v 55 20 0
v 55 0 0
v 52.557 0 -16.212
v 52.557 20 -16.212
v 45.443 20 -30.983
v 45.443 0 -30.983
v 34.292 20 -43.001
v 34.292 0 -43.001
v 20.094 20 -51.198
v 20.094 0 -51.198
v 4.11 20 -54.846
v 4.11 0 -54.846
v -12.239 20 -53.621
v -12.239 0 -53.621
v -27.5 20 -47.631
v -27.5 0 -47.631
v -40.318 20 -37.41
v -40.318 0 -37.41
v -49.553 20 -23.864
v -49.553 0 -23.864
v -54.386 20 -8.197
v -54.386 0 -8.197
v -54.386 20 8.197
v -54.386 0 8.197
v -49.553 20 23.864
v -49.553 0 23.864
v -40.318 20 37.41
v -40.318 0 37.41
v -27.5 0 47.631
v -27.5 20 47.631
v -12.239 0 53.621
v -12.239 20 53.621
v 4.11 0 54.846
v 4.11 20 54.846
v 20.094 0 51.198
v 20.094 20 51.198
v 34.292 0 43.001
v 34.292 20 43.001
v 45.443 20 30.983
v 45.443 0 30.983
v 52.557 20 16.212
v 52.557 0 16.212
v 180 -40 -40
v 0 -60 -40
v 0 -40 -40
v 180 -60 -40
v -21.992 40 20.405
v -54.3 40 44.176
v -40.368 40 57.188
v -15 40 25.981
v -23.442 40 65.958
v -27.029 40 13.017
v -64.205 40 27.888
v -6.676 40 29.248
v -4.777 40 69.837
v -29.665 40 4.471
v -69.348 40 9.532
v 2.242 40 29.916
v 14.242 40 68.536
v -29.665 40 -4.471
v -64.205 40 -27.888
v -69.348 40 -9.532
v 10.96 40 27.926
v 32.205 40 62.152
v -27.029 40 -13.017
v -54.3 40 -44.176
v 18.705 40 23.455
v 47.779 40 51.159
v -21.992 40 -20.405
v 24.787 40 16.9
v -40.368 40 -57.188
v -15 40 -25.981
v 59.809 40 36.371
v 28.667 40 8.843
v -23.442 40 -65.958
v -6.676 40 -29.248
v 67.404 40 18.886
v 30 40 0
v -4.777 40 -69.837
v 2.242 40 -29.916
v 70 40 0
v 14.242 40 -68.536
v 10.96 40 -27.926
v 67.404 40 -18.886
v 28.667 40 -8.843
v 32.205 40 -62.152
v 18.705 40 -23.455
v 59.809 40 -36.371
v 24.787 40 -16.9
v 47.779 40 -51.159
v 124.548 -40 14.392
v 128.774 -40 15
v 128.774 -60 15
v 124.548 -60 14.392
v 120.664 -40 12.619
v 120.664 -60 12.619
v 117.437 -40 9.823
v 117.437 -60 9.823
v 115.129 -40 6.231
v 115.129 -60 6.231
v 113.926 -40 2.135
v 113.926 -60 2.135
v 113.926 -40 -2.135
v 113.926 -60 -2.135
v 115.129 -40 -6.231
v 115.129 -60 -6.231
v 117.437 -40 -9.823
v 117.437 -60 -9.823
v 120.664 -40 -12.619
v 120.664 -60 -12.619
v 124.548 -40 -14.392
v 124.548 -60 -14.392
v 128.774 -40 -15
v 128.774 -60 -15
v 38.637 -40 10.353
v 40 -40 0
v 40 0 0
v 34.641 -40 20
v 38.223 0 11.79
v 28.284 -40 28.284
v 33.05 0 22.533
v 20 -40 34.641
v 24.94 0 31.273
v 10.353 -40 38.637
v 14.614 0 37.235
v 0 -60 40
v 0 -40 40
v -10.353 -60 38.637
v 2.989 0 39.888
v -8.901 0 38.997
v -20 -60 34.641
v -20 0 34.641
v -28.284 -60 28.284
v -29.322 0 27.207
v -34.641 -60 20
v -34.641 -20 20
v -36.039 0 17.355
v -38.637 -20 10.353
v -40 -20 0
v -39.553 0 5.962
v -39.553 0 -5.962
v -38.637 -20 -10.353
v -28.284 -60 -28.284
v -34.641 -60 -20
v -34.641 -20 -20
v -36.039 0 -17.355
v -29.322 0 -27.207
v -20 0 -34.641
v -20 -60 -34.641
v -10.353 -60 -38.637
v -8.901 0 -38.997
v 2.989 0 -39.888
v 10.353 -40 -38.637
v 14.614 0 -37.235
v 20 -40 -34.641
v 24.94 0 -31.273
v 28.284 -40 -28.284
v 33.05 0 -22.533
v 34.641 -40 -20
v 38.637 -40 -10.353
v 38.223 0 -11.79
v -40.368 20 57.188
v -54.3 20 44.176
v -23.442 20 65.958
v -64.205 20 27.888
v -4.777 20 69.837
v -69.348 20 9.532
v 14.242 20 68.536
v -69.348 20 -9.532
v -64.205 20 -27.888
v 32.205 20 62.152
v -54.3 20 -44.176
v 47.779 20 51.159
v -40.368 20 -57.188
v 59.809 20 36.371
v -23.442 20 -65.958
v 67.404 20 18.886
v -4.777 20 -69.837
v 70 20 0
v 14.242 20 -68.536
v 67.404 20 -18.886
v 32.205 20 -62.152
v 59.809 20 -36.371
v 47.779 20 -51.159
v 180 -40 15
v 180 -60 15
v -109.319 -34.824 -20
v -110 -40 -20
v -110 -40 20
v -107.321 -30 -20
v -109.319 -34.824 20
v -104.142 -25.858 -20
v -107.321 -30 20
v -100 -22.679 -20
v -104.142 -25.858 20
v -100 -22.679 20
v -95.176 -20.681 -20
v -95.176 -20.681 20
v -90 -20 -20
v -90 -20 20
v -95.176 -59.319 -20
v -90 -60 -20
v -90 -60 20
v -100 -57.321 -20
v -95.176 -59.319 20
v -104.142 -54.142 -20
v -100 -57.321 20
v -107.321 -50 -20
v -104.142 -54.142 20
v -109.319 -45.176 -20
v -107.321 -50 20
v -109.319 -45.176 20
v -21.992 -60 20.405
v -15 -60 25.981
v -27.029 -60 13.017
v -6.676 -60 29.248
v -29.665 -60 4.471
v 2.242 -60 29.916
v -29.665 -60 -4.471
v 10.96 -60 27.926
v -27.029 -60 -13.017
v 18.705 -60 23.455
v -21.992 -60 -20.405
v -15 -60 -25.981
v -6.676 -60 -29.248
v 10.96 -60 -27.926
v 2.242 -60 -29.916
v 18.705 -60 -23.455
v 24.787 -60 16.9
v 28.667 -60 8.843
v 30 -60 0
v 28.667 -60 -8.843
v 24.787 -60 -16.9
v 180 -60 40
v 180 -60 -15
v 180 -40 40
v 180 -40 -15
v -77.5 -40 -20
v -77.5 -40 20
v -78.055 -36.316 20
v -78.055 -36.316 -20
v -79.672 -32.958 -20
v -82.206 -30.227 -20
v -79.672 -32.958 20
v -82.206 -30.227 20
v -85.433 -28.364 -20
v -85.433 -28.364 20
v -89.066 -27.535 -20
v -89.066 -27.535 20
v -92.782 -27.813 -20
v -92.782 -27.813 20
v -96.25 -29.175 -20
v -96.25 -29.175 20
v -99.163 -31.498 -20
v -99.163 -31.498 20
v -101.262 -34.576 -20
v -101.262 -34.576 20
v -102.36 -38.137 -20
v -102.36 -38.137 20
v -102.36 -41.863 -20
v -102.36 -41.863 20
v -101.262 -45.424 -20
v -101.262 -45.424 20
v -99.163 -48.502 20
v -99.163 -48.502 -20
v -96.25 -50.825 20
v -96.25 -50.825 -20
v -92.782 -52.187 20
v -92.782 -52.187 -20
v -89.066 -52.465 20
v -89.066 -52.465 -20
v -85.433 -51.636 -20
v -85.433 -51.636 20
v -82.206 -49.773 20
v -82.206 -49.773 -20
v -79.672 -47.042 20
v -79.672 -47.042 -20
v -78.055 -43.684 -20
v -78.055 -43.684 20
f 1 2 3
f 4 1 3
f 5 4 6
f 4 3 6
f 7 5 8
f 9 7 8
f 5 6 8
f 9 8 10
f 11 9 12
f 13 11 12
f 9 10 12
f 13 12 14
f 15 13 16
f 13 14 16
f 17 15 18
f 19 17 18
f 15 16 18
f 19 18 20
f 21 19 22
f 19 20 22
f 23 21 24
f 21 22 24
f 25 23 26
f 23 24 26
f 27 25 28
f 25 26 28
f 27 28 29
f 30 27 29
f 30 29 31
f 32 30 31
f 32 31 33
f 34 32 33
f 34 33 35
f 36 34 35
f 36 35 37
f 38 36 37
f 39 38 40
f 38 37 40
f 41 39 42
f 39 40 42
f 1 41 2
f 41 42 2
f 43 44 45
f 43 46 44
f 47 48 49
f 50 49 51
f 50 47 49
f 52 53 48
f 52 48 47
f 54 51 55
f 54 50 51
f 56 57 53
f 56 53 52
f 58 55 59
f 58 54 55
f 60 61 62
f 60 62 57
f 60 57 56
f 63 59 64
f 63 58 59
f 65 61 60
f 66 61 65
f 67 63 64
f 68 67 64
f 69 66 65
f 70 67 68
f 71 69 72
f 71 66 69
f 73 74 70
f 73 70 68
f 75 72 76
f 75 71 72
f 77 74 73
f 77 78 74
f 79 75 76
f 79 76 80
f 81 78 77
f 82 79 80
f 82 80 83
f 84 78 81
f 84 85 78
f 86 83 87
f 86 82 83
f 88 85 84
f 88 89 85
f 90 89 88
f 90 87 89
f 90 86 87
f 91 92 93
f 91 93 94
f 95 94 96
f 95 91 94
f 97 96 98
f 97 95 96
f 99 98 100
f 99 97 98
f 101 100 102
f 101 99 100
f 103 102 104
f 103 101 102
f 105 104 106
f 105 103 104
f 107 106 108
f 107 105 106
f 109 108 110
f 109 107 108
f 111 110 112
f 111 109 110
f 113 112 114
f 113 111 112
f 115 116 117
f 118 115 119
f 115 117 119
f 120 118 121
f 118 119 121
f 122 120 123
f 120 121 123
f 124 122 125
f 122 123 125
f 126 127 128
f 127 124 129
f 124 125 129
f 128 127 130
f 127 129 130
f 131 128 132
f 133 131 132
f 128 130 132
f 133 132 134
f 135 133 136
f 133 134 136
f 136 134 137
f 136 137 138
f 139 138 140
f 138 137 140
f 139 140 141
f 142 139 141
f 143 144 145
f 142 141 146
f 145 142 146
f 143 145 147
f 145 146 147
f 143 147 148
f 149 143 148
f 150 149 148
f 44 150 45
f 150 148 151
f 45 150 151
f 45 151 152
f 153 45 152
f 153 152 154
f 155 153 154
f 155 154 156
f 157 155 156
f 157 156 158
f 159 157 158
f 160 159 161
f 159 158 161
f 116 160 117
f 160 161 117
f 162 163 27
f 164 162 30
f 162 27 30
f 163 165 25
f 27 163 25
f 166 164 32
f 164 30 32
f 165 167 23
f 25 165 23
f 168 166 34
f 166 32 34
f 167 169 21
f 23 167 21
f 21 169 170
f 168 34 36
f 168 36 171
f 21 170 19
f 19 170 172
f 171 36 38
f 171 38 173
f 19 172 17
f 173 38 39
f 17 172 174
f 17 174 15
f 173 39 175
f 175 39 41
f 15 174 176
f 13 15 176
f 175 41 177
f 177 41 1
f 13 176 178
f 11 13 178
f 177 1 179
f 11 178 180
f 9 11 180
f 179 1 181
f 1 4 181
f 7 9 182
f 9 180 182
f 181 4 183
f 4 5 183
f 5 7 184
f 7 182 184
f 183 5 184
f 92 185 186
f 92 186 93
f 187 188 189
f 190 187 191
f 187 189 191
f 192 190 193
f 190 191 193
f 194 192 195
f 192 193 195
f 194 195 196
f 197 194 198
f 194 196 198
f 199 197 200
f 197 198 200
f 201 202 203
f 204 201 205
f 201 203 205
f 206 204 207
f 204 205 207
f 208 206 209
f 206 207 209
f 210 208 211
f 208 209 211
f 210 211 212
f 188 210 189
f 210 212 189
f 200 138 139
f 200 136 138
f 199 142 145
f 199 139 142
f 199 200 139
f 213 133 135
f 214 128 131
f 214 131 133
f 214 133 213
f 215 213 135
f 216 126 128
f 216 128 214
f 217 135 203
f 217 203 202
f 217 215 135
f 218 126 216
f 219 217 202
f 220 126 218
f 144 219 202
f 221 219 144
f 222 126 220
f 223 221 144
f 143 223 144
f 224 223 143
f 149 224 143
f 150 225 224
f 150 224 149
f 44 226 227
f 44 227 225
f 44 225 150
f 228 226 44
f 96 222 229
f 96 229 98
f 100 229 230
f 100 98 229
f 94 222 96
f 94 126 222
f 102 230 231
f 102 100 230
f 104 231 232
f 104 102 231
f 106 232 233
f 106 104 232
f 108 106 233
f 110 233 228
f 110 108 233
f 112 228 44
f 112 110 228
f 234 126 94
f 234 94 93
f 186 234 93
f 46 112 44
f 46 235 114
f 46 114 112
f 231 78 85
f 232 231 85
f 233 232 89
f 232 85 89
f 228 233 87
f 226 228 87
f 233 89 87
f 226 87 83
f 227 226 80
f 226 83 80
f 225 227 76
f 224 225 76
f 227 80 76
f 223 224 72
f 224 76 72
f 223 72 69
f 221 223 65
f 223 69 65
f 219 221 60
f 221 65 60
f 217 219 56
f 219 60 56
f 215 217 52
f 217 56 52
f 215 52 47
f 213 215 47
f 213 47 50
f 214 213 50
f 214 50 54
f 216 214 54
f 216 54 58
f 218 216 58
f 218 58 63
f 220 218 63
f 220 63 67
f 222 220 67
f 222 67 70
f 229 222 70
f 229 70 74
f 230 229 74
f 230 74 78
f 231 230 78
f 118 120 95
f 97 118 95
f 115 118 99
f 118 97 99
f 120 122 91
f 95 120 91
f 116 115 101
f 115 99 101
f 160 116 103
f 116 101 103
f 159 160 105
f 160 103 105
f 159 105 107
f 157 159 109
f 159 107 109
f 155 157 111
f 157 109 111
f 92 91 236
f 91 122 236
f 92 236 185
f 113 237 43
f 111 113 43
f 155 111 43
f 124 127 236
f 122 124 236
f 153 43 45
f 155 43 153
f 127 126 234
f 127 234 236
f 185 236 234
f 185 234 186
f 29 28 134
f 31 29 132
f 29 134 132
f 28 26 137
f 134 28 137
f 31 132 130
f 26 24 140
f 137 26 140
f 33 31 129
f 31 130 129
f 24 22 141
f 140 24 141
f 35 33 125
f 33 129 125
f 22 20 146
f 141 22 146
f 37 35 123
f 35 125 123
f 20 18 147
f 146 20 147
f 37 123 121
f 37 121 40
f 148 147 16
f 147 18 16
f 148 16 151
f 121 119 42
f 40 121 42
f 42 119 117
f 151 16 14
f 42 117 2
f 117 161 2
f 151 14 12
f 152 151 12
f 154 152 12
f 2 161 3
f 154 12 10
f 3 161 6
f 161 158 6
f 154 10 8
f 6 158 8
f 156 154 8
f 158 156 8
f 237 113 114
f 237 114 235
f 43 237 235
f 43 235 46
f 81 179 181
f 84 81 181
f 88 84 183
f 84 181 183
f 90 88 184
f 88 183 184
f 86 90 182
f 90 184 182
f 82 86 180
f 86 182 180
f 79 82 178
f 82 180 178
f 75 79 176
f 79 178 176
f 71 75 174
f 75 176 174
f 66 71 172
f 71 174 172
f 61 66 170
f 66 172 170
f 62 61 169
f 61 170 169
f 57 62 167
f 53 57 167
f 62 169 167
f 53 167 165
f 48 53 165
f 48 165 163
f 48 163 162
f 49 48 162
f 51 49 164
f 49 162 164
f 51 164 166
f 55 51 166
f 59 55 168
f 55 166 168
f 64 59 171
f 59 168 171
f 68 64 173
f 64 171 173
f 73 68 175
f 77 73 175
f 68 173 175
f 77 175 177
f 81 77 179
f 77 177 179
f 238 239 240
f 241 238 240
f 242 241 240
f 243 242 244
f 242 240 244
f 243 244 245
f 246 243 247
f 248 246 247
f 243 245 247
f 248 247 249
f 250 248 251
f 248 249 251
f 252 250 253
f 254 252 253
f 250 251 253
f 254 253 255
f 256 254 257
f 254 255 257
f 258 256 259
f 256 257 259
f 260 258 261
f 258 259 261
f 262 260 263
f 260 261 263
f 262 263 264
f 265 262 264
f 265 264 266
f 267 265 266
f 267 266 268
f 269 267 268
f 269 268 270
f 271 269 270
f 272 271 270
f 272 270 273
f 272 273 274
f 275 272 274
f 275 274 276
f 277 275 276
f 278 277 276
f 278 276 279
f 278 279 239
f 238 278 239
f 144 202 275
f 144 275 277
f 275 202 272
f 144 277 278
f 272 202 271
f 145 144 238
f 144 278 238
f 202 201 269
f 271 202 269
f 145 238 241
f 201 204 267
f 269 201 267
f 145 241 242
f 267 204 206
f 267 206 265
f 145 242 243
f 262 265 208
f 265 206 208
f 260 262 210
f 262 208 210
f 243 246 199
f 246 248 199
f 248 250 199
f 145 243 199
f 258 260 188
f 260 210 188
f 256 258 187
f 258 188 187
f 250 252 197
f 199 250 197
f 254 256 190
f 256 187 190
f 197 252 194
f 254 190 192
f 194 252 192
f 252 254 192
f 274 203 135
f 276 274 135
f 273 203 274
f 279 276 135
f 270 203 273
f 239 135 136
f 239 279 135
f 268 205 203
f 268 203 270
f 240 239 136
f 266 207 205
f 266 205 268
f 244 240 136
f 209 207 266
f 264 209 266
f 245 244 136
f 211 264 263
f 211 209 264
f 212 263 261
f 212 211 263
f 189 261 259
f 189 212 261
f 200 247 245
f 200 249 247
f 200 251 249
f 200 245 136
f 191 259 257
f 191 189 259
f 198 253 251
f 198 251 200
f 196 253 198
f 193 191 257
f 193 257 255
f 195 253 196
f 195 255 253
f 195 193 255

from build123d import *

# Parameters (mm, degrees)
SKETCH1_R           = 55
BOSS_EXTRUDE1_DEPTH = 20
SKETCH2_R           = 70
BOSS_EXTRUDE2_DEPTH = 20
SKETCH3_R           = 40
BOSS_EXTRUDE3_DEPTH = 60
CUT_EXTRUDE1_REACH  = 102
SKETCH4_R           = 30
BOSS_EXTRUDE4_REACH = 252
SKETCH6_W           = 80
SKETCH6_H           = 20
CUT_EXTRUDE2_DEPTH  = 60
BOSS_EXTRUDE5_REACH = 292
SKETCH10_W          = 40
SKETCH10_H          = 40
CUT_EXTRUDE3_DEPTH  = 60
SKETCH12_R          = 12.5
CUT_EXTRUDE4_DEPTH  = 60


with BuildPart() as part:
    # Sketch1 → Boss-Extrude1 (new body)
    with BuildSketch(Plane(origin=(0, 0, 0), x_dir=(1, 0, 0), z_dir=(0, 1, 0))):
        Circle(SKETCH1_R)
    extrude(amount=BOSS_EXTRUDE1_DEPTH)

    # Sketch2 → Boss-Extrude2 (add)
    with BuildSketch(Plane(origin=(0, 20, 0), x_dir=(1, 0, 0), z_dir=(0, 1, 0))):
        Circle(SKETCH2_R)
    extrude(amount=BOSS_EXTRUDE2_DEPTH)

    # Sketch3 → Boss-Extrude3 (add)
    with BuildSketch(Plane.XZ):
        Circle(SKETCH3_R)
    extrude(amount=BOSS_EXTRUDE3_DEPTH)

    # Sketch4 → Cut-Extrude1 (cut, up to next)
    with BuildSketch(Plane(origin=(0, 40, 0), x_dir=(1, 0, 0), z_dir=(0, 1, 0)), mode=Mode.PRIVATE) as cut_extrude1_sk1:
        Circle(SKETCH4_R)
    cut_extrude1_tool1 = extrude(cut_extrude1_sk1.sketch, amount=-CUT_EXTRUDE1_REACH, mode=Mode.PRIVATE) & part.part
    add(cut_extrude1_tool1.solids().sort_by_distance((0, 40, 0))[0], mode=Mode.SUBTRACT)

    # Sketch6 → Boss-Extrude4 (add, up to next)
    with BuildSketch(Plane(origin=(180, 0, 0), x_dir=(0, 0, -1), z_dir=(1, 0, 0)), mode=Mode.PRIVATE) as boss_extrude4_sk1:
        with Locations((0, -50)):
            Rectangle(SKETCH6_W, SKETCH6_H)
    boss_extrude4_tool1 = extrude(boss_extrude4_sk1.sketch, amount=-BOSS_EXTRUDE4_REACH, mode=Mode.PRIVATE) - part.part
    add(boss_extrude4_tool1.solids().sort_by_distance((180, -50, 0))[0])

    # Sketch8 → Cut-Extrude2 (cut)
    with BuildSketch(Plane(origin=(0, -40, 0), x_dir=(1, 0, 0), z_dir=(0, 1, 0))):
        with BuildLine():
            Line((180, 15), (180, -15))
            Line((180, -15), (128.7735226, -15))
            ThreePointArc((128.7735226, -15), (113.7735226, 0), (128.7735226, 15))
            Line((128.7735226, 15), (180, 15))
        make_face()
    extrude(amount=-CUT_EXTRUDE2_DEPTH, mode=Mode.SUBTRACT)

    # Sketch10 → Boss-Extrude5 (add, up to next)
    with BuildSketch(Plane(origin=(-110, 0, 0), x_dir=(0, 0, -1), z_dir=(1, 0, 0)), mode=Mode.PRIVATE) as boss_extrude5_sk1:
        with Locations((0, -40)):
            Rectangle(SKETCH10_W, SKETCH10_H)
    boss_extrude5_tool1 = extrude(boss_extrude5_sk1.sketch, amount=BOSS_EXTRUDE5_REACH, mode=Mode.PRIVATE) - part.part
    add(boss_extrude5_tool1.solids().sort_by_distance((-110, -40, 0))[0])

    # Sketch11 → Cut-Extrude3 (cut)
    with BuildSketch(Plane.XY.offset(20)):
        with BuildLine():
            ThreePointArc((-110, -40), (-104.142135624, -25.857864376), (-90, -20))
            Line((-90, -20), (-110, -20))
            Line((-110, -20), (-110, -40))
        make_face()
        with BuildLine():
            ThreePointArc((-90, -60), (-104.142135624, -54.142135624), (-110, -40))
            Line((-110, -40), (-110, -60))
            Line((-110, -60), (-90, -60))
        make_face()
    extrude(amount=-CUT_EXTRUDE3_DEPTH, mode=Mode.SUBTRACT)

    # Sketch12 → Cut-Extrude4 (cut)
    with BuildSketch(Plane.XY.offset(20)):
        with Locations((-90, -40)):
            Circle(SKETCH12_R)
    extrude(amount=-CUT_EXTRUDE4_DEPTH, mode=Mode.SUBTRACT)


solid = part.part
